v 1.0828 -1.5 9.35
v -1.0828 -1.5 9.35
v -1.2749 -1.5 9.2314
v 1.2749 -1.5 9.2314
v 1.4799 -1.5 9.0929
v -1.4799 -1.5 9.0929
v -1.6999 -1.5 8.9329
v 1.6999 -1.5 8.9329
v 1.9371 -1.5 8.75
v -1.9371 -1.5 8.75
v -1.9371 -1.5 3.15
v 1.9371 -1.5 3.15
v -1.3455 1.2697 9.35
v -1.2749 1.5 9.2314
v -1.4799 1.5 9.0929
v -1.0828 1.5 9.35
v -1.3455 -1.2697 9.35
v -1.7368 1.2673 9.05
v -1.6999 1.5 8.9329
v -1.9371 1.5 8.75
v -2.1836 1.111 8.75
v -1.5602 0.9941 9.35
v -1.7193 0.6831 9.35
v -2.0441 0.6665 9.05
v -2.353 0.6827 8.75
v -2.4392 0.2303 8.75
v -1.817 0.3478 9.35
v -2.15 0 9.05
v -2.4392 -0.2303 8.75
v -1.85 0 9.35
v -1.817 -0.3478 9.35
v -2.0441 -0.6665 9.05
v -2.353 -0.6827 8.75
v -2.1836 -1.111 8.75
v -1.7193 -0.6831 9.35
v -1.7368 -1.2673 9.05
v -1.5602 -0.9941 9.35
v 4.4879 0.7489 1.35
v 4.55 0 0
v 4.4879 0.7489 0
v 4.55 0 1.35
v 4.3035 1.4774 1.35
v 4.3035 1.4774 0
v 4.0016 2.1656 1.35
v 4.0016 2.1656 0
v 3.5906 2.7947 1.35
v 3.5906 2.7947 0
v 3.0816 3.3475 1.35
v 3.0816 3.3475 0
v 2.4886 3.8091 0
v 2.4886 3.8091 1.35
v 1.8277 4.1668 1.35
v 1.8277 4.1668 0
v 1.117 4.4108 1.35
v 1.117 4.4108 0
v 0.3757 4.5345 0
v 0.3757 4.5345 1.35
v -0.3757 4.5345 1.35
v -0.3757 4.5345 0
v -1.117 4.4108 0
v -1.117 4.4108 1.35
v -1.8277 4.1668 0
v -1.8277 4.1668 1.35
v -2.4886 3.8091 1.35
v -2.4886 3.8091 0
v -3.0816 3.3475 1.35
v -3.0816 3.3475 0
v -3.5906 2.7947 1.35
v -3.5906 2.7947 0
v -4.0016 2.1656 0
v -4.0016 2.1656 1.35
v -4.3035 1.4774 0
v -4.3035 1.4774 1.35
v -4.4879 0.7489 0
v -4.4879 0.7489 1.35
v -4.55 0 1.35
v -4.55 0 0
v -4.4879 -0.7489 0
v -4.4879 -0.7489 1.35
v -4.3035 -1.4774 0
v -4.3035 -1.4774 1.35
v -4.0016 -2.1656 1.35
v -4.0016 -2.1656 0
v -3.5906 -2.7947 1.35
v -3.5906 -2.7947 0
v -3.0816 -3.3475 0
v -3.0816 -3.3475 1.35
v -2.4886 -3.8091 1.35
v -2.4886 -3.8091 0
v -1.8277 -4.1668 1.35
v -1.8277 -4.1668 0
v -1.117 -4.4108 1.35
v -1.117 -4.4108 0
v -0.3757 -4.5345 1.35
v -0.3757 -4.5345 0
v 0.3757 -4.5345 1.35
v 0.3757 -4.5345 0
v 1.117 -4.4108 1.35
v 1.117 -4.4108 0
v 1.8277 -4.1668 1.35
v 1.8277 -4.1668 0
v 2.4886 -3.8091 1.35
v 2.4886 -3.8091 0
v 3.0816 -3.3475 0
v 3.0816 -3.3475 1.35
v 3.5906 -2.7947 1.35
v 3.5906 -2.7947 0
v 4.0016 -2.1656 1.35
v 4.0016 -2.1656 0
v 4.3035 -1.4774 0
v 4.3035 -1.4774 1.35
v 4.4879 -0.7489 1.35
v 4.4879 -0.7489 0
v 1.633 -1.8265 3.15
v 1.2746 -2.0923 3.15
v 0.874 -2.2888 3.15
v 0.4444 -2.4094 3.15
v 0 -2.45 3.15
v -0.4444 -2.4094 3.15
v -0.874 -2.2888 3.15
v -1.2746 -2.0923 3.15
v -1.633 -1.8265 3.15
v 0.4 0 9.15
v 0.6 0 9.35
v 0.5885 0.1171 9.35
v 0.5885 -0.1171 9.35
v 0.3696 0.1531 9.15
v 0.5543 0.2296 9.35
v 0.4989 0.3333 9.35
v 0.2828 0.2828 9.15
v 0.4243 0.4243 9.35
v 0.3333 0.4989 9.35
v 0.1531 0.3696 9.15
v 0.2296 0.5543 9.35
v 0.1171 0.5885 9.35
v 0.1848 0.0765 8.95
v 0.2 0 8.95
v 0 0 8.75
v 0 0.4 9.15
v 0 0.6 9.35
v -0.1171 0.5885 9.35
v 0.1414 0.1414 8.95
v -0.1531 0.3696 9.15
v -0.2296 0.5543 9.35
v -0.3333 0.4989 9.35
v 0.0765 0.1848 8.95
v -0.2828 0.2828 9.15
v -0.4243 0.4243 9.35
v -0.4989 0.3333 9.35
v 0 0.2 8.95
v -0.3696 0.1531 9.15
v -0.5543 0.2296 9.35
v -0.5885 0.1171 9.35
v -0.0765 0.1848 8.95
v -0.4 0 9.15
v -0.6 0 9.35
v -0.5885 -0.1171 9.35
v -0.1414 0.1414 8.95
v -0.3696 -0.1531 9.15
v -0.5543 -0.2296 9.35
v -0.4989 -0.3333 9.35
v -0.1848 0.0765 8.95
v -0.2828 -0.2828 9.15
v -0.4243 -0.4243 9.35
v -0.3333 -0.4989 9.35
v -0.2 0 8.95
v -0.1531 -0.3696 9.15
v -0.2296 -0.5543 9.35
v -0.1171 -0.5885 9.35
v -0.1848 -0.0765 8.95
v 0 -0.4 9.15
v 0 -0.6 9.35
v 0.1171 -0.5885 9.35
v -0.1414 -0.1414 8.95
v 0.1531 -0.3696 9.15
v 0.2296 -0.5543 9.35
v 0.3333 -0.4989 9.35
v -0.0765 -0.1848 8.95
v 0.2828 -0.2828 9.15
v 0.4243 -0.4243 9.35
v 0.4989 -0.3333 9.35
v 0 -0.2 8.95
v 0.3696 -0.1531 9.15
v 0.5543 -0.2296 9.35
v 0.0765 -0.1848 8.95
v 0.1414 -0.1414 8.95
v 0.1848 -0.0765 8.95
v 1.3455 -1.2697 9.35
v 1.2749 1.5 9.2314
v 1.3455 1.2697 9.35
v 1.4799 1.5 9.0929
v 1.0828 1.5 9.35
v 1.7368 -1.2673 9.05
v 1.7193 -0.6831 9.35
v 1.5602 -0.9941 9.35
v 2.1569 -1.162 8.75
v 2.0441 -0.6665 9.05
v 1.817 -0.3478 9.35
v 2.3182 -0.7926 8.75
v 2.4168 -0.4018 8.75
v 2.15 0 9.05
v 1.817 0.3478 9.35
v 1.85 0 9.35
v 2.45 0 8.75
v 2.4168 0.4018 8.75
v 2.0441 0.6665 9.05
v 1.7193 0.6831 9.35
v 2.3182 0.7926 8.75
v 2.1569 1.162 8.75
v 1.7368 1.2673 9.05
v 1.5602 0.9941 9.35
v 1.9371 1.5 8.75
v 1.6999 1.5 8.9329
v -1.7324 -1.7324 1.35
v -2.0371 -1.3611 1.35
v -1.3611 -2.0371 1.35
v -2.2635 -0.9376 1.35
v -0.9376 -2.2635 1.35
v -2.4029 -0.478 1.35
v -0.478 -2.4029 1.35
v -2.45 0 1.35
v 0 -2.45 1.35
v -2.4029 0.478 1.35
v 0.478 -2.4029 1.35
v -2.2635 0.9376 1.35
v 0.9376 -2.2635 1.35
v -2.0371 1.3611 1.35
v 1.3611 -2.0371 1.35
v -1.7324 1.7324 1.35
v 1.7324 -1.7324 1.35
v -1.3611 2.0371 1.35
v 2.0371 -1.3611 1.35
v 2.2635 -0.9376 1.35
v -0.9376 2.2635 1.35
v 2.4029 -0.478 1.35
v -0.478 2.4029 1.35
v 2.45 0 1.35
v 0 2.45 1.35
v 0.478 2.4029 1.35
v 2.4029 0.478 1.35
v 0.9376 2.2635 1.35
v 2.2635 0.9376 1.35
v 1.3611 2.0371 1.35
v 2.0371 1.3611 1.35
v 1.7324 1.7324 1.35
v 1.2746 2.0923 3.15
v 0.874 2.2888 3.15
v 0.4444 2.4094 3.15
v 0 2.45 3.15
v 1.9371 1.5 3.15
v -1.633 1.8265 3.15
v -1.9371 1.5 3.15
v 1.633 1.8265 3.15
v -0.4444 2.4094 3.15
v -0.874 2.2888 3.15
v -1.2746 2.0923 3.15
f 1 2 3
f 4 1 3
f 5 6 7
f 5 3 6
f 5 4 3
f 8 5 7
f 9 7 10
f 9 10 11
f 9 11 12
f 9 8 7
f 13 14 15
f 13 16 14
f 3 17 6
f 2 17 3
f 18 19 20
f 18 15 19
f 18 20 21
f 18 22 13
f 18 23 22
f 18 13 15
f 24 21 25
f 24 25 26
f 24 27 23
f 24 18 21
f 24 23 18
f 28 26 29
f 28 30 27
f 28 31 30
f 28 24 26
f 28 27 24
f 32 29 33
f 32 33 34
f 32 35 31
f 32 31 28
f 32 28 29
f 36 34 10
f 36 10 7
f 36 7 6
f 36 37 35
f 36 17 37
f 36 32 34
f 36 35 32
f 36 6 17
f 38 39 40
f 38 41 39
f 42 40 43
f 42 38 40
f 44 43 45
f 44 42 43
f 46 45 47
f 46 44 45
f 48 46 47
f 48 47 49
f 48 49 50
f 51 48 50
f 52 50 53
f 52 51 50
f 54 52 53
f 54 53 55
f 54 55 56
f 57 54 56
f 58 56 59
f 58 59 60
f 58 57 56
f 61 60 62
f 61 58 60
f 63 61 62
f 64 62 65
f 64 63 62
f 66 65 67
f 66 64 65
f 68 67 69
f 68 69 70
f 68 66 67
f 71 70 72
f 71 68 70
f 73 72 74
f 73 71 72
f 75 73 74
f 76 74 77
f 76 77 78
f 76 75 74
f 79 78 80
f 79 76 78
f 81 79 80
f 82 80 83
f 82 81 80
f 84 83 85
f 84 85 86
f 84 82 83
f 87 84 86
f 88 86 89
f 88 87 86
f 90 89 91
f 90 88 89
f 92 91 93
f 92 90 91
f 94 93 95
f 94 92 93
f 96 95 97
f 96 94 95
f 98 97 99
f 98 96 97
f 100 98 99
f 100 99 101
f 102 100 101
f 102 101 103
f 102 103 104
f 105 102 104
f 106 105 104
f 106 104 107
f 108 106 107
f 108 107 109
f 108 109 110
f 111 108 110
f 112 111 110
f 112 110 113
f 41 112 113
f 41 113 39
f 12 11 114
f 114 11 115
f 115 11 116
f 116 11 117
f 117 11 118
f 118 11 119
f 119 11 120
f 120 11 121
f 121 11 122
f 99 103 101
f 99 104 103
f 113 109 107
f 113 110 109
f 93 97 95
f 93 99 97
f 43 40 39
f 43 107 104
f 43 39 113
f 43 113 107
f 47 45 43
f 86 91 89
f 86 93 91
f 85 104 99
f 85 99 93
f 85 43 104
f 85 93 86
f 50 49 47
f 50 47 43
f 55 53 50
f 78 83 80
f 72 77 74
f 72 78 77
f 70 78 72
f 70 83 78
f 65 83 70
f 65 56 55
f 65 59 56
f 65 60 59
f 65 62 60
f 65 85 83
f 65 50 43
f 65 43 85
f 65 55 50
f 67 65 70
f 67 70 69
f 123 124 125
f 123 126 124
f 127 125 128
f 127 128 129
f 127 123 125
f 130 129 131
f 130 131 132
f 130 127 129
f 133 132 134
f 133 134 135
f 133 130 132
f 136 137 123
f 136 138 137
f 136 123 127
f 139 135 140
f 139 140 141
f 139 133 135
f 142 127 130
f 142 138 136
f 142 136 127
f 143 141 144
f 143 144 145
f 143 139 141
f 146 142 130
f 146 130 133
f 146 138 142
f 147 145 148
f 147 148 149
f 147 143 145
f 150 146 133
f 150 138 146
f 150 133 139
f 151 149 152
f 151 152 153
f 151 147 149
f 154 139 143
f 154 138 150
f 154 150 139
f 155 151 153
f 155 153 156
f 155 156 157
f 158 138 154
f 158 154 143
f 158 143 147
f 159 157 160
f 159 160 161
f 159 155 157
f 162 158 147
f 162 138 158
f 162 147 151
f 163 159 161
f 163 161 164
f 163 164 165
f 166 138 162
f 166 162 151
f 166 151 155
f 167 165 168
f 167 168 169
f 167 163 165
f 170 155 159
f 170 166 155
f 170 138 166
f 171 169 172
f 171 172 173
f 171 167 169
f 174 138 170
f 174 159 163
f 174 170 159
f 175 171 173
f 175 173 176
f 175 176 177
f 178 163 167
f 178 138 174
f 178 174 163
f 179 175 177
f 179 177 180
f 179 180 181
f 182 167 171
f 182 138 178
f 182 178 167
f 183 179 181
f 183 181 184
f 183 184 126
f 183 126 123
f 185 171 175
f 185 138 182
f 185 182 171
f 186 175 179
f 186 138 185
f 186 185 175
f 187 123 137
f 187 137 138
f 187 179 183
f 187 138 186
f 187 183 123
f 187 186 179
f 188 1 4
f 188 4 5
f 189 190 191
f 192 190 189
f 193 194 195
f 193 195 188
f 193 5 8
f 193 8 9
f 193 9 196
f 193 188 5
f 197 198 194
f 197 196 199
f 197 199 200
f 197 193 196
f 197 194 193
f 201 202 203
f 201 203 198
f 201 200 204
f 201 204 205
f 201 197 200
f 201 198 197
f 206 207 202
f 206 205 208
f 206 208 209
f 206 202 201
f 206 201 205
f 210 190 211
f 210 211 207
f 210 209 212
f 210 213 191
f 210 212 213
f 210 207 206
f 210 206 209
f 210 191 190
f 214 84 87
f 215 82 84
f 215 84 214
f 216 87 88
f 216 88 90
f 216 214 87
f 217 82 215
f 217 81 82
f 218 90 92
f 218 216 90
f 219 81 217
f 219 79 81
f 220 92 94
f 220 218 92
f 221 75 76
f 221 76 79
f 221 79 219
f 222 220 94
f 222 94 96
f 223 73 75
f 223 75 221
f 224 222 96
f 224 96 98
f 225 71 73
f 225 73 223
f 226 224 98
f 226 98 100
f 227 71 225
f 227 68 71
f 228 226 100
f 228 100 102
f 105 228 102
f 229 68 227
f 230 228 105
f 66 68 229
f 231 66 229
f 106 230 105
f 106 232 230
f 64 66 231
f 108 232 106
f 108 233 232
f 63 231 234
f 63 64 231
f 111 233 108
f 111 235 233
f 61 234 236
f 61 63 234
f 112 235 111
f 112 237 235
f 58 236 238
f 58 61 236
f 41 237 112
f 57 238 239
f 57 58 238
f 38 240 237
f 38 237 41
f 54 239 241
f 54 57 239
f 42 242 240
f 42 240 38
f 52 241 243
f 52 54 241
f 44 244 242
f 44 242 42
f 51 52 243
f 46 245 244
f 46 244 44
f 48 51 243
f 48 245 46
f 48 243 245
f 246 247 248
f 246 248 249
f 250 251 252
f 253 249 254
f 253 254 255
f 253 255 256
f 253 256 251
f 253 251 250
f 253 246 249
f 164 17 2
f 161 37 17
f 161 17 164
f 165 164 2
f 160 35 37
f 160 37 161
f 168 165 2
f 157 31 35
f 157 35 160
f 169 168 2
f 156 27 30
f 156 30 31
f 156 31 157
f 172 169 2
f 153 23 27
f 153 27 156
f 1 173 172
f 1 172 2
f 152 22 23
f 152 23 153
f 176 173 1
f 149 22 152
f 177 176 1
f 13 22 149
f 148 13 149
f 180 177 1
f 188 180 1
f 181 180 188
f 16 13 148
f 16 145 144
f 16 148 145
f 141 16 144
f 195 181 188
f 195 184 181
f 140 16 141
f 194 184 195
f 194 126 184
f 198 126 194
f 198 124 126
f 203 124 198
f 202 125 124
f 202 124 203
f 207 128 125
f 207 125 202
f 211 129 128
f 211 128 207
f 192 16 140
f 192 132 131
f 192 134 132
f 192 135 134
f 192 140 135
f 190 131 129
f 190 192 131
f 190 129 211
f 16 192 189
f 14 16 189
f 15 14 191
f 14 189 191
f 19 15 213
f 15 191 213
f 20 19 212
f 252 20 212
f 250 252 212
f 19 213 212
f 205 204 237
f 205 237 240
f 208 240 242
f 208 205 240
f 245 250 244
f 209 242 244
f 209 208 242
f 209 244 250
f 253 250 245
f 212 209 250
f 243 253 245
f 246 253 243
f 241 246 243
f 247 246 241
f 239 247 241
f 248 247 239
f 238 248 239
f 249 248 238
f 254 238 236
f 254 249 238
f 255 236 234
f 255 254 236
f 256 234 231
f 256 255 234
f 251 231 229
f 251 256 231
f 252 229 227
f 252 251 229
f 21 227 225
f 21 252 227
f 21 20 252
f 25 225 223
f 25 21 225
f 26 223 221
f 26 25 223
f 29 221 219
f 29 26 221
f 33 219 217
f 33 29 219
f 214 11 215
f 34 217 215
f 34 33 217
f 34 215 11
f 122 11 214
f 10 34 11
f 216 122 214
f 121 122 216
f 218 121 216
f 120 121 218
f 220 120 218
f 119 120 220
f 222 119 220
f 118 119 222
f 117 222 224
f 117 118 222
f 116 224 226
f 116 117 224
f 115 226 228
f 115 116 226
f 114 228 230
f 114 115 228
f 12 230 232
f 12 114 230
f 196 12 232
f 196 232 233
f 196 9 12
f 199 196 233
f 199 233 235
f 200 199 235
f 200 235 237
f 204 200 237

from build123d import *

# Parameters (mm, degrees)
F2_W     = 7.161952
F2_H     = 3
F3_DEPTH = 6.2


with BuildPart() as f1:
    # F0 (on Front) → F1 (revolve)
    with BuildSketch(Plane.XZ):
        Polygon((0, 8.75), (0, 0), (4.55, 0), (4.55, 1.35), (2.45, 1.35), (2.45, 8.75), (1.85, 9.35), (0.6, 9.35), align=None)
    revolve(axis=Axis((0, 0, 11.047808), (0, 0, 1)))

    # F2 (on face) → F3 (cut)
    with BuildSketch(Plane.XY.offset(9.35)):
        with Locations((0.21525, 3)):
            Rectangle(F2_W, F2_H)
        with Locations((0.21525, -3)):
            Rectangle(F2_W, F2_H)
    extrude(amount=-F3_DEPTH, mode=Mode.SUBTRACT)


solid = f1.part
